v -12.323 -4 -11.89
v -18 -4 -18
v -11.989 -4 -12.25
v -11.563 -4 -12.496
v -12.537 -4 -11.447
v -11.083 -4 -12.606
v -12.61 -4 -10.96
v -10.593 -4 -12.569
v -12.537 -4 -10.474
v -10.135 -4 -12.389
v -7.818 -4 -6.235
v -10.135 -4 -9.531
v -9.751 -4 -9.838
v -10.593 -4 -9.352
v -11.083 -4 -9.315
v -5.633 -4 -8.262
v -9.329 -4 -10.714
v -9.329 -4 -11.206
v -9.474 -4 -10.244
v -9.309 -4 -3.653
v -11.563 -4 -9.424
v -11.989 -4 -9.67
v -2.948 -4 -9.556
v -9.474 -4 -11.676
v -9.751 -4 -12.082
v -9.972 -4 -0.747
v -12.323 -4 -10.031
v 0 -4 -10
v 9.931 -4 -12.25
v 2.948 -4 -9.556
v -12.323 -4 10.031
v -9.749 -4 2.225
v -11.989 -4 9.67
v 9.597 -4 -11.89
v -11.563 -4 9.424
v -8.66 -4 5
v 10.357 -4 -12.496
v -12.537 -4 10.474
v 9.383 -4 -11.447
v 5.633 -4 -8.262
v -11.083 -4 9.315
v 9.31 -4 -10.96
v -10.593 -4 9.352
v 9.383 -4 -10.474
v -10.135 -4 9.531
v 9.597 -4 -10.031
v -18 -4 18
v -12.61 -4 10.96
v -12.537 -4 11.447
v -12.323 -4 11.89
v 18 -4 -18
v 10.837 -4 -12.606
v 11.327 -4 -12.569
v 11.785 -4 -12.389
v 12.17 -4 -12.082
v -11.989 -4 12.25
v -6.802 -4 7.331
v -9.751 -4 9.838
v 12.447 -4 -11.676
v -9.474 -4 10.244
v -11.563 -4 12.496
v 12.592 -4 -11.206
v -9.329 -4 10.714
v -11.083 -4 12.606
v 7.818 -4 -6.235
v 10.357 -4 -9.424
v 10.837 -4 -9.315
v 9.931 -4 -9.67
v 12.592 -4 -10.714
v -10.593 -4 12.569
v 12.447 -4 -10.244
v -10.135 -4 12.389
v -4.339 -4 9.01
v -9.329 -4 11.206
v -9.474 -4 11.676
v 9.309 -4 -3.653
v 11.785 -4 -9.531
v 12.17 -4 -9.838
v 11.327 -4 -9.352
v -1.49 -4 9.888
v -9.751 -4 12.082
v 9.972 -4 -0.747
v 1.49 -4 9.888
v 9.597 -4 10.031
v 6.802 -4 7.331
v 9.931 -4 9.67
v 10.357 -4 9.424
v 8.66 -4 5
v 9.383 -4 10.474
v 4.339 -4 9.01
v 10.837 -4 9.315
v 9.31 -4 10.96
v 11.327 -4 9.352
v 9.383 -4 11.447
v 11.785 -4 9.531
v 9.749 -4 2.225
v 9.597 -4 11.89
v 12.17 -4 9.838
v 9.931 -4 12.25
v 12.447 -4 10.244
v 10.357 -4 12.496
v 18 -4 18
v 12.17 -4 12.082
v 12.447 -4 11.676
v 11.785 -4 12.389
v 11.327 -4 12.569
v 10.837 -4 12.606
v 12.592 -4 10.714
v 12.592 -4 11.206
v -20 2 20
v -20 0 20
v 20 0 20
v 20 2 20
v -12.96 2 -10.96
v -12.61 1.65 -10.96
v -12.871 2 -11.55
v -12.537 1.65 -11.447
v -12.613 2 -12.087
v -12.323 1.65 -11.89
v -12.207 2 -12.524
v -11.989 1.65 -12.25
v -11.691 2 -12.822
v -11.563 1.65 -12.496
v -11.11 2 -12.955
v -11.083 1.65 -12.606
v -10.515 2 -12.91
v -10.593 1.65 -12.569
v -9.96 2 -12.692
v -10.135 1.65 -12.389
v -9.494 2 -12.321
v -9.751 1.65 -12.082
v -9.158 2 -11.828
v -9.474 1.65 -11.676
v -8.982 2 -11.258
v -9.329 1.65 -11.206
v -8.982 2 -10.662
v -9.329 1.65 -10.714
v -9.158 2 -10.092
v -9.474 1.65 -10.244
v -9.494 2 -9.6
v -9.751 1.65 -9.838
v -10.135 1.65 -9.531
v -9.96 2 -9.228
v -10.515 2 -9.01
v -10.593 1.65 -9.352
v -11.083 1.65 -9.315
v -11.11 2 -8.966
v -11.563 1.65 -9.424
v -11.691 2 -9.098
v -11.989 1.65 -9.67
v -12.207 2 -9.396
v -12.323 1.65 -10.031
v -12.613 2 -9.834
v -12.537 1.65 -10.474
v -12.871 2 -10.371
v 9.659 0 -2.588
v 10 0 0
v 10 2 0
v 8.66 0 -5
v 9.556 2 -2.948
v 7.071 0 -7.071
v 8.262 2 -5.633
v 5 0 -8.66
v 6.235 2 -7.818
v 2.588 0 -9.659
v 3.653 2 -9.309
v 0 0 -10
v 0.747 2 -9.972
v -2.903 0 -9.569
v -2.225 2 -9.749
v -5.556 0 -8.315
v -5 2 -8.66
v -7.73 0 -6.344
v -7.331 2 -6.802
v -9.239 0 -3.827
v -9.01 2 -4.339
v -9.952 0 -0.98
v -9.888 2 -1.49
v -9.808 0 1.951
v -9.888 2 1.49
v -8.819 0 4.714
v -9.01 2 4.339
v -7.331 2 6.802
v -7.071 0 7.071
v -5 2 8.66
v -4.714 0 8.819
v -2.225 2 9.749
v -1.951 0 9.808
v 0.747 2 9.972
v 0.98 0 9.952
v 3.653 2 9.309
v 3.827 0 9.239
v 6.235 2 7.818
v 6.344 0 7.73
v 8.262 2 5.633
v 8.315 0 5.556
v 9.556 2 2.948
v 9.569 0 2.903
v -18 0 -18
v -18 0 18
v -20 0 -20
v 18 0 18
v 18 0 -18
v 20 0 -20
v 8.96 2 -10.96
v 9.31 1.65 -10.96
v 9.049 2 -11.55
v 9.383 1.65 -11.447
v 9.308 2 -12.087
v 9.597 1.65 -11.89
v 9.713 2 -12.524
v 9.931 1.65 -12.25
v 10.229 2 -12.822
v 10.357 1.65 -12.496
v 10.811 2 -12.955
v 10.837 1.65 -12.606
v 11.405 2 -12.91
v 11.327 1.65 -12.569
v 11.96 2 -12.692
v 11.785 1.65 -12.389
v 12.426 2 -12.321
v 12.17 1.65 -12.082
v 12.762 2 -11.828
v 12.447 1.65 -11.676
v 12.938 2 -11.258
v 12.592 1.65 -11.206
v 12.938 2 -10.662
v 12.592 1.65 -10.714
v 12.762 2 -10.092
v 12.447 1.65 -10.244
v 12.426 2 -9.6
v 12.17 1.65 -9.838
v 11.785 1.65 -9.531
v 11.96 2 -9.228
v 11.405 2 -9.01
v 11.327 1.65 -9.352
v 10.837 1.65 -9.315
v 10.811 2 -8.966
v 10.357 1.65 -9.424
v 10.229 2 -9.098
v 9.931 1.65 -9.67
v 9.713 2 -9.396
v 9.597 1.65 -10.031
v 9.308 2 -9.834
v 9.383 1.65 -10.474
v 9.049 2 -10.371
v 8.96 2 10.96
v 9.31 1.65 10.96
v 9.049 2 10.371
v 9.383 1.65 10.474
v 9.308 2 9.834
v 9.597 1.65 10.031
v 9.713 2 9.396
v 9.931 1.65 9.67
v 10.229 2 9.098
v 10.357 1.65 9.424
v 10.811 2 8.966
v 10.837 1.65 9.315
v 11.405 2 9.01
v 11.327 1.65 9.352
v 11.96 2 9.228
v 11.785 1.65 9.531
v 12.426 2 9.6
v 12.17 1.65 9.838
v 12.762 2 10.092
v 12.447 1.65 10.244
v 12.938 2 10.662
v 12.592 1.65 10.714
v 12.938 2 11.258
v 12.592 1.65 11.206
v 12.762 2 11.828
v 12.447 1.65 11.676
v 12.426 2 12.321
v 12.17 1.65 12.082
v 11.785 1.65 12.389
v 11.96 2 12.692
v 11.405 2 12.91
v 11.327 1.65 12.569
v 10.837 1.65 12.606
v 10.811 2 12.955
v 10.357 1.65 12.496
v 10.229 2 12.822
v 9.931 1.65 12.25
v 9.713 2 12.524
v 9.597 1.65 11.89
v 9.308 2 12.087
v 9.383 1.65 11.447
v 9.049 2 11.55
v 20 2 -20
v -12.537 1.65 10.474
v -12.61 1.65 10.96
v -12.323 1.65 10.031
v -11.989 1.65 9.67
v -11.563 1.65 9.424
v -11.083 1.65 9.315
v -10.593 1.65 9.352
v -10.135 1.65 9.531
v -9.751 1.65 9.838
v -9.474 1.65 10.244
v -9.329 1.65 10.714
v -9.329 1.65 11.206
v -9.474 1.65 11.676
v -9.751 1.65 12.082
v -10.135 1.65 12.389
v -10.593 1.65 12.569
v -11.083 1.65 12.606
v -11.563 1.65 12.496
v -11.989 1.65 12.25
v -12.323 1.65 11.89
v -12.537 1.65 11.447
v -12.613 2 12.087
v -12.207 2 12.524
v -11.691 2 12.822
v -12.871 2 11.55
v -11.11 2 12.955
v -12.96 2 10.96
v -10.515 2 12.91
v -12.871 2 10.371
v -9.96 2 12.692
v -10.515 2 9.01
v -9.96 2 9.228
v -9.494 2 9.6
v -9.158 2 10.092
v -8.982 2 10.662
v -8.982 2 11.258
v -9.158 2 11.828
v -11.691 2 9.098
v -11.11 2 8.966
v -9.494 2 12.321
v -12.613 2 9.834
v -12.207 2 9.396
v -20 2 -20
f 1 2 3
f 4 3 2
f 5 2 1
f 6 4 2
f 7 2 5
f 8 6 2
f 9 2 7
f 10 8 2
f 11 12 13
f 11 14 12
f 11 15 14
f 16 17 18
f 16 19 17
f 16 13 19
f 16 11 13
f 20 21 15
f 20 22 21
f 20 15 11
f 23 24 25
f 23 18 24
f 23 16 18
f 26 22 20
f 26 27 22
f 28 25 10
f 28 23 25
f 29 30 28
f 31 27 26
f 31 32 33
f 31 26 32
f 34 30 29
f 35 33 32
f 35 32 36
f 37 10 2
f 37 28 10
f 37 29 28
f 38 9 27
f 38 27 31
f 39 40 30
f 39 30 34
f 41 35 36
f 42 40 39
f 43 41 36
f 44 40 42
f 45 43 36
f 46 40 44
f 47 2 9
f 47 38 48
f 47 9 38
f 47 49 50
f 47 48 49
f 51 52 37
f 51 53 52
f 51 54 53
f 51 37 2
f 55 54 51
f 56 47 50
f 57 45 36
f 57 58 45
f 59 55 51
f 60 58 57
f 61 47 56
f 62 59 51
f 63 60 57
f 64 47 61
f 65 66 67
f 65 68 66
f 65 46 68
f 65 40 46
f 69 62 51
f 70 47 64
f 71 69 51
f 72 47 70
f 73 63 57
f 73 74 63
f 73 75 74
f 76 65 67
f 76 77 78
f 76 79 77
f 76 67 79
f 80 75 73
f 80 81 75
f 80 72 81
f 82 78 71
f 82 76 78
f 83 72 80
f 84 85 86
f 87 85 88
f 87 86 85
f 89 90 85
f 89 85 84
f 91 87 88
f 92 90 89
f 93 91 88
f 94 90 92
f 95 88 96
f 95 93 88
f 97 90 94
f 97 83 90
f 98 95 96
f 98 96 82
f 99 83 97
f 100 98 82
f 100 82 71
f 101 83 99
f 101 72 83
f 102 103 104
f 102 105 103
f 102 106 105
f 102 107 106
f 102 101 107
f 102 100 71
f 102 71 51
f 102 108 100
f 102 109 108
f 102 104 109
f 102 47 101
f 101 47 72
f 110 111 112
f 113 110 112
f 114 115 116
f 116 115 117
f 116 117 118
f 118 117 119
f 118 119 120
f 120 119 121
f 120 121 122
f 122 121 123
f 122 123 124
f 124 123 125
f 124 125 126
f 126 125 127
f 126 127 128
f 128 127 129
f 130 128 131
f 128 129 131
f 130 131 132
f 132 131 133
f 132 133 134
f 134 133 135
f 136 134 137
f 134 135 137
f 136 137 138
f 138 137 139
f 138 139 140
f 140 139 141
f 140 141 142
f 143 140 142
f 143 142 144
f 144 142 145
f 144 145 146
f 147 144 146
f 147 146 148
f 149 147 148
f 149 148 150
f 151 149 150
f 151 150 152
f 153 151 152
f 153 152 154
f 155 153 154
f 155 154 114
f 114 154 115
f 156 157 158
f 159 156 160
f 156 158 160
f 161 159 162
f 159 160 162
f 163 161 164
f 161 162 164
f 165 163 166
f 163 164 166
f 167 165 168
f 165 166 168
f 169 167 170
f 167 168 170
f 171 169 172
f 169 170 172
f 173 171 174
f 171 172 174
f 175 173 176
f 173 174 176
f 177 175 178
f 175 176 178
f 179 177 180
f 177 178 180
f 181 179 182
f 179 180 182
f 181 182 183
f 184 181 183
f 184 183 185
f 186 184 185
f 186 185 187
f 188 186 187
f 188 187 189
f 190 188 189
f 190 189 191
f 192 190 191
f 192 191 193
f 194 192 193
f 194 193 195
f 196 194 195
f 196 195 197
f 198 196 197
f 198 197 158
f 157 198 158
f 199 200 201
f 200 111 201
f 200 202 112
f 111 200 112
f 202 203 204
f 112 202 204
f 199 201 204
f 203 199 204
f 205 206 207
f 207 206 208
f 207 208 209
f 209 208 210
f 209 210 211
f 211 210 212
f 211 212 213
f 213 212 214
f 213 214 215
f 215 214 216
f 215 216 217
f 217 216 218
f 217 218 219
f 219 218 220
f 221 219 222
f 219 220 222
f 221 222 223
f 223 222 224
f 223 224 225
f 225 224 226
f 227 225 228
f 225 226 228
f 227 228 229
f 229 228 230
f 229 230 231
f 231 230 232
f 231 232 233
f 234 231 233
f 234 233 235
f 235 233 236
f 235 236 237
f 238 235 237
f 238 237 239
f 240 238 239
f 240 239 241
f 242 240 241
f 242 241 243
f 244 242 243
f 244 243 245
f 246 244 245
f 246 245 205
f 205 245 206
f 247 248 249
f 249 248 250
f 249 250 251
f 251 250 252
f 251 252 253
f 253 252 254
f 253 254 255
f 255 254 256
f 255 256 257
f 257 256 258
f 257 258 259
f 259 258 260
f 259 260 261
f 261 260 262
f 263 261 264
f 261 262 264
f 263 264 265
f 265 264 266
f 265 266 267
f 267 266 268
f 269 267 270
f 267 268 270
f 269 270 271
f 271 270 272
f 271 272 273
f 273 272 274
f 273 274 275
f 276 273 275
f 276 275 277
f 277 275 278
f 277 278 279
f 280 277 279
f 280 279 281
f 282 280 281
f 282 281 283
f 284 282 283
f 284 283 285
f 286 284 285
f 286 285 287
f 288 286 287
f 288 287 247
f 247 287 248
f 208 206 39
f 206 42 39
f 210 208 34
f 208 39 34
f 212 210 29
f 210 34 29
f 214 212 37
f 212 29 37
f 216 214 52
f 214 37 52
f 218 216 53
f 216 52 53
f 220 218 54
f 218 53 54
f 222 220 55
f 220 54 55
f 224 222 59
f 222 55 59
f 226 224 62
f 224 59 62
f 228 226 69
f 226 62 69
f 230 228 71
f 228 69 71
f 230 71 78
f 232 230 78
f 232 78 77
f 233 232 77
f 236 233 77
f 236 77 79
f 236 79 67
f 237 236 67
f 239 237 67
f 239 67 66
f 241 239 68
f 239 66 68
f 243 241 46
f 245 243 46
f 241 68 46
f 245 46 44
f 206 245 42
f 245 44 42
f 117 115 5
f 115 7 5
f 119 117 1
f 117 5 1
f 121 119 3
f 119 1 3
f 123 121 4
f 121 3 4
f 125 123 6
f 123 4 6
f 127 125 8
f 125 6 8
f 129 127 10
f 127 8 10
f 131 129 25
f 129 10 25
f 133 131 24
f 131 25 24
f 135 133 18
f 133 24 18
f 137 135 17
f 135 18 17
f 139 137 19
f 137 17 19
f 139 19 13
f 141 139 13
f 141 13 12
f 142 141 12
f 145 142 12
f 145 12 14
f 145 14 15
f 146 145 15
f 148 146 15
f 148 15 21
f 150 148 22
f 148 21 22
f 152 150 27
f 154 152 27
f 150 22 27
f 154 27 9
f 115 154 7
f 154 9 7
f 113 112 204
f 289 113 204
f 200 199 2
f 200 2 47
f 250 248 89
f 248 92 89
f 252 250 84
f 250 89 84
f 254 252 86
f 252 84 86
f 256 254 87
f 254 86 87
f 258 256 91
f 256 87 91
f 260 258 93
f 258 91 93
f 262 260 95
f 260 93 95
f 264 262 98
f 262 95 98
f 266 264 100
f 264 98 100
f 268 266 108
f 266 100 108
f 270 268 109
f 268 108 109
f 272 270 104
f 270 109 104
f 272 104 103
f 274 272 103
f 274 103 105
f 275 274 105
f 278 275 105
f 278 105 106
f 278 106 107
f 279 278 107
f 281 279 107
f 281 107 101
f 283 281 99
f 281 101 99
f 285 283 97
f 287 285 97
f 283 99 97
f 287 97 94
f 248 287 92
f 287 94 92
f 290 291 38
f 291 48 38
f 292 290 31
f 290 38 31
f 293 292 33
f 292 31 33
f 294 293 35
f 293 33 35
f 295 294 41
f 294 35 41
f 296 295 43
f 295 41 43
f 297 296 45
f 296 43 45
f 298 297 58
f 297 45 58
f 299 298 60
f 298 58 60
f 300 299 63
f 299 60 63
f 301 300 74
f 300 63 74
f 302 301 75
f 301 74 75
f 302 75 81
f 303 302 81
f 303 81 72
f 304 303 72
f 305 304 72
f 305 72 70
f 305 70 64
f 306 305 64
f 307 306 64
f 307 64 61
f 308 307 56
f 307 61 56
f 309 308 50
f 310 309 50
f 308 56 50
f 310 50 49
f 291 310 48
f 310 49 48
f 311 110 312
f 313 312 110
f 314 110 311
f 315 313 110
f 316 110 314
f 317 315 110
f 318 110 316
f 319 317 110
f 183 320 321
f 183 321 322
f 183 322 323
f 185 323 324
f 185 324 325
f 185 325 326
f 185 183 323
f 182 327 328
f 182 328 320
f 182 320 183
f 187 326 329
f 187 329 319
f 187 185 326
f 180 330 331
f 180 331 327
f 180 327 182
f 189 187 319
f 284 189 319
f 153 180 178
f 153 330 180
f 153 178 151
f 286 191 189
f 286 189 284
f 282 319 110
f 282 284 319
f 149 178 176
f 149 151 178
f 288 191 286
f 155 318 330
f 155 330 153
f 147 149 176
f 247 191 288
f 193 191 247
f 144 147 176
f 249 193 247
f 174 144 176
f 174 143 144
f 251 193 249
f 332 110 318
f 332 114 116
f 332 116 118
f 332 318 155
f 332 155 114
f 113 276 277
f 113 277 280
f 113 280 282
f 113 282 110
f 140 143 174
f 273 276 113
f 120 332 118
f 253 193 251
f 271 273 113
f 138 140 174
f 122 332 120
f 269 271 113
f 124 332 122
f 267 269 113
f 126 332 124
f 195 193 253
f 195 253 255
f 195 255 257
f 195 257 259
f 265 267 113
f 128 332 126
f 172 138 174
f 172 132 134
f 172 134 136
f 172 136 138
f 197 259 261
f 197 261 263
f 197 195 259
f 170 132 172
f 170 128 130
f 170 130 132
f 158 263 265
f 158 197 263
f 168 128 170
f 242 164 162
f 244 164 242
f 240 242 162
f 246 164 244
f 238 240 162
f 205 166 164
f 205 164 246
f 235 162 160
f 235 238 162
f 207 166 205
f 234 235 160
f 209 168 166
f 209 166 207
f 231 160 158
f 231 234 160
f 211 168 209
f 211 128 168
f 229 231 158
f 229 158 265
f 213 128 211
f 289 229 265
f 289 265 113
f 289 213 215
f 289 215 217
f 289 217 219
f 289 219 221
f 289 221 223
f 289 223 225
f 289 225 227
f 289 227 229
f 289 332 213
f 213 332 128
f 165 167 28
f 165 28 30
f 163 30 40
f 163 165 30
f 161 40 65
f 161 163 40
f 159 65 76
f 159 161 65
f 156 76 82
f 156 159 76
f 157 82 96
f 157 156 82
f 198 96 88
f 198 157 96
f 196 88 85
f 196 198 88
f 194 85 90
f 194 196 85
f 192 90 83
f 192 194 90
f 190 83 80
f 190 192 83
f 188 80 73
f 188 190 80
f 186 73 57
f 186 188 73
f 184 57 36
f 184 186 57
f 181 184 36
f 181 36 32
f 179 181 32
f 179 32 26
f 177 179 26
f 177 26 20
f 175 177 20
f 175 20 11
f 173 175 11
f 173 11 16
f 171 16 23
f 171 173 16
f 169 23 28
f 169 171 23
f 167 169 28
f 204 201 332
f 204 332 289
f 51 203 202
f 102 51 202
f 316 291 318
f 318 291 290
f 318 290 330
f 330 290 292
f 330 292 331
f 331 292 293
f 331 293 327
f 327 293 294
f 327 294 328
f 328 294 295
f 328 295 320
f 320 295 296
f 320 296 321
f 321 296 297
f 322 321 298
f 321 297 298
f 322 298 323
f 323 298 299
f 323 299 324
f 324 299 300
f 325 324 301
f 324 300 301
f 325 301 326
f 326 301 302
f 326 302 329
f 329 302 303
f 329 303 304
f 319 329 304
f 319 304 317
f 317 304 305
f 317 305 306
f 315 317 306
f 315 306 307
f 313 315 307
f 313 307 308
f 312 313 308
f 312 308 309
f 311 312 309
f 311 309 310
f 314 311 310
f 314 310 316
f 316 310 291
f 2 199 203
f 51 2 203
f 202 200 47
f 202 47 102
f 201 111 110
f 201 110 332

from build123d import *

# Parameters (mm, degrees)
SKETCH1_W                         = 40
SKETCH1_H                         = 40
BOSS_EXTRUDE1_DEPTH               = 2
F_25_0MM_DOWEL_HOLE1_D            = 20
SKETCH9_W                         = 36
SKETCH9_H                         = 36
SKETCH9_R                         = 10
BOSS_EXTRUDE2_DEPTH               = 4
TAP_DRILL_FOR_M4_TAP2_D           = 3.3
TAP_DRILL_FOR_M4_TAP2_CSINK_D     = 4
TAP_DRILL_FOR_M4_TAP2_CSINK_ANGLE = 90


with BuildPart() as part:
    # Sketch1 → Boss-Extrude1 (new body)
    with BuildSketch(Plane(origin=(0, 0, 0), x_dir=(1, 0, 0), z_dir=(0, 1, 0))):
        Rectangle(SKETCH1_W, SKETCH1_H)
    extrude(amount=BOSS_EXTRUDE1_DEPTH)

    # Ø25.0mm Dowel Hole1 (through all)
    with Locations(Plane(origin=(0, 0, 0), x_dir=(-1, 0, 0), z_dir=(0, -1, 0))):
        with Locations((0, 0)):
            Hole(F_25_0MM_DOWEL_HOLE1_D / 2)

    # Sketch9 → Boss-Extrude2 (add)
    with BuildSketch(Plane.XZ):
        Rectangle(SKETCH9_W, SKETCH9_H)
        Circle(SKETCH9_R, mode=Mode.SUBTRACT)
    extrude(amount=BOSS_EXTRUDE2_DEPTH)

    # Tap Drill for M4 Tap2 (through all)
    with Locations(Plane(origin=(0, 2, 0), x_dir=(1, 0, 0), z_dir=(0, 1, 0))):
        with Locations((-10.960155108, 10.960155108), (10.960155108, 10.960155108), (10.960155108, -10.960155108), (-10.960155108, -10.960155108)):
            CounterSinkHole(TAP_DRILL_FOR_M4_TAP2_D / 2, TAP_DRILL_FOR_M4_TAP2_CSINK_D / 2, counter_sink_angle=TAP_DRILL_FOR_M4_TAP2_CSINK_ANGLE)


solid = part.part
